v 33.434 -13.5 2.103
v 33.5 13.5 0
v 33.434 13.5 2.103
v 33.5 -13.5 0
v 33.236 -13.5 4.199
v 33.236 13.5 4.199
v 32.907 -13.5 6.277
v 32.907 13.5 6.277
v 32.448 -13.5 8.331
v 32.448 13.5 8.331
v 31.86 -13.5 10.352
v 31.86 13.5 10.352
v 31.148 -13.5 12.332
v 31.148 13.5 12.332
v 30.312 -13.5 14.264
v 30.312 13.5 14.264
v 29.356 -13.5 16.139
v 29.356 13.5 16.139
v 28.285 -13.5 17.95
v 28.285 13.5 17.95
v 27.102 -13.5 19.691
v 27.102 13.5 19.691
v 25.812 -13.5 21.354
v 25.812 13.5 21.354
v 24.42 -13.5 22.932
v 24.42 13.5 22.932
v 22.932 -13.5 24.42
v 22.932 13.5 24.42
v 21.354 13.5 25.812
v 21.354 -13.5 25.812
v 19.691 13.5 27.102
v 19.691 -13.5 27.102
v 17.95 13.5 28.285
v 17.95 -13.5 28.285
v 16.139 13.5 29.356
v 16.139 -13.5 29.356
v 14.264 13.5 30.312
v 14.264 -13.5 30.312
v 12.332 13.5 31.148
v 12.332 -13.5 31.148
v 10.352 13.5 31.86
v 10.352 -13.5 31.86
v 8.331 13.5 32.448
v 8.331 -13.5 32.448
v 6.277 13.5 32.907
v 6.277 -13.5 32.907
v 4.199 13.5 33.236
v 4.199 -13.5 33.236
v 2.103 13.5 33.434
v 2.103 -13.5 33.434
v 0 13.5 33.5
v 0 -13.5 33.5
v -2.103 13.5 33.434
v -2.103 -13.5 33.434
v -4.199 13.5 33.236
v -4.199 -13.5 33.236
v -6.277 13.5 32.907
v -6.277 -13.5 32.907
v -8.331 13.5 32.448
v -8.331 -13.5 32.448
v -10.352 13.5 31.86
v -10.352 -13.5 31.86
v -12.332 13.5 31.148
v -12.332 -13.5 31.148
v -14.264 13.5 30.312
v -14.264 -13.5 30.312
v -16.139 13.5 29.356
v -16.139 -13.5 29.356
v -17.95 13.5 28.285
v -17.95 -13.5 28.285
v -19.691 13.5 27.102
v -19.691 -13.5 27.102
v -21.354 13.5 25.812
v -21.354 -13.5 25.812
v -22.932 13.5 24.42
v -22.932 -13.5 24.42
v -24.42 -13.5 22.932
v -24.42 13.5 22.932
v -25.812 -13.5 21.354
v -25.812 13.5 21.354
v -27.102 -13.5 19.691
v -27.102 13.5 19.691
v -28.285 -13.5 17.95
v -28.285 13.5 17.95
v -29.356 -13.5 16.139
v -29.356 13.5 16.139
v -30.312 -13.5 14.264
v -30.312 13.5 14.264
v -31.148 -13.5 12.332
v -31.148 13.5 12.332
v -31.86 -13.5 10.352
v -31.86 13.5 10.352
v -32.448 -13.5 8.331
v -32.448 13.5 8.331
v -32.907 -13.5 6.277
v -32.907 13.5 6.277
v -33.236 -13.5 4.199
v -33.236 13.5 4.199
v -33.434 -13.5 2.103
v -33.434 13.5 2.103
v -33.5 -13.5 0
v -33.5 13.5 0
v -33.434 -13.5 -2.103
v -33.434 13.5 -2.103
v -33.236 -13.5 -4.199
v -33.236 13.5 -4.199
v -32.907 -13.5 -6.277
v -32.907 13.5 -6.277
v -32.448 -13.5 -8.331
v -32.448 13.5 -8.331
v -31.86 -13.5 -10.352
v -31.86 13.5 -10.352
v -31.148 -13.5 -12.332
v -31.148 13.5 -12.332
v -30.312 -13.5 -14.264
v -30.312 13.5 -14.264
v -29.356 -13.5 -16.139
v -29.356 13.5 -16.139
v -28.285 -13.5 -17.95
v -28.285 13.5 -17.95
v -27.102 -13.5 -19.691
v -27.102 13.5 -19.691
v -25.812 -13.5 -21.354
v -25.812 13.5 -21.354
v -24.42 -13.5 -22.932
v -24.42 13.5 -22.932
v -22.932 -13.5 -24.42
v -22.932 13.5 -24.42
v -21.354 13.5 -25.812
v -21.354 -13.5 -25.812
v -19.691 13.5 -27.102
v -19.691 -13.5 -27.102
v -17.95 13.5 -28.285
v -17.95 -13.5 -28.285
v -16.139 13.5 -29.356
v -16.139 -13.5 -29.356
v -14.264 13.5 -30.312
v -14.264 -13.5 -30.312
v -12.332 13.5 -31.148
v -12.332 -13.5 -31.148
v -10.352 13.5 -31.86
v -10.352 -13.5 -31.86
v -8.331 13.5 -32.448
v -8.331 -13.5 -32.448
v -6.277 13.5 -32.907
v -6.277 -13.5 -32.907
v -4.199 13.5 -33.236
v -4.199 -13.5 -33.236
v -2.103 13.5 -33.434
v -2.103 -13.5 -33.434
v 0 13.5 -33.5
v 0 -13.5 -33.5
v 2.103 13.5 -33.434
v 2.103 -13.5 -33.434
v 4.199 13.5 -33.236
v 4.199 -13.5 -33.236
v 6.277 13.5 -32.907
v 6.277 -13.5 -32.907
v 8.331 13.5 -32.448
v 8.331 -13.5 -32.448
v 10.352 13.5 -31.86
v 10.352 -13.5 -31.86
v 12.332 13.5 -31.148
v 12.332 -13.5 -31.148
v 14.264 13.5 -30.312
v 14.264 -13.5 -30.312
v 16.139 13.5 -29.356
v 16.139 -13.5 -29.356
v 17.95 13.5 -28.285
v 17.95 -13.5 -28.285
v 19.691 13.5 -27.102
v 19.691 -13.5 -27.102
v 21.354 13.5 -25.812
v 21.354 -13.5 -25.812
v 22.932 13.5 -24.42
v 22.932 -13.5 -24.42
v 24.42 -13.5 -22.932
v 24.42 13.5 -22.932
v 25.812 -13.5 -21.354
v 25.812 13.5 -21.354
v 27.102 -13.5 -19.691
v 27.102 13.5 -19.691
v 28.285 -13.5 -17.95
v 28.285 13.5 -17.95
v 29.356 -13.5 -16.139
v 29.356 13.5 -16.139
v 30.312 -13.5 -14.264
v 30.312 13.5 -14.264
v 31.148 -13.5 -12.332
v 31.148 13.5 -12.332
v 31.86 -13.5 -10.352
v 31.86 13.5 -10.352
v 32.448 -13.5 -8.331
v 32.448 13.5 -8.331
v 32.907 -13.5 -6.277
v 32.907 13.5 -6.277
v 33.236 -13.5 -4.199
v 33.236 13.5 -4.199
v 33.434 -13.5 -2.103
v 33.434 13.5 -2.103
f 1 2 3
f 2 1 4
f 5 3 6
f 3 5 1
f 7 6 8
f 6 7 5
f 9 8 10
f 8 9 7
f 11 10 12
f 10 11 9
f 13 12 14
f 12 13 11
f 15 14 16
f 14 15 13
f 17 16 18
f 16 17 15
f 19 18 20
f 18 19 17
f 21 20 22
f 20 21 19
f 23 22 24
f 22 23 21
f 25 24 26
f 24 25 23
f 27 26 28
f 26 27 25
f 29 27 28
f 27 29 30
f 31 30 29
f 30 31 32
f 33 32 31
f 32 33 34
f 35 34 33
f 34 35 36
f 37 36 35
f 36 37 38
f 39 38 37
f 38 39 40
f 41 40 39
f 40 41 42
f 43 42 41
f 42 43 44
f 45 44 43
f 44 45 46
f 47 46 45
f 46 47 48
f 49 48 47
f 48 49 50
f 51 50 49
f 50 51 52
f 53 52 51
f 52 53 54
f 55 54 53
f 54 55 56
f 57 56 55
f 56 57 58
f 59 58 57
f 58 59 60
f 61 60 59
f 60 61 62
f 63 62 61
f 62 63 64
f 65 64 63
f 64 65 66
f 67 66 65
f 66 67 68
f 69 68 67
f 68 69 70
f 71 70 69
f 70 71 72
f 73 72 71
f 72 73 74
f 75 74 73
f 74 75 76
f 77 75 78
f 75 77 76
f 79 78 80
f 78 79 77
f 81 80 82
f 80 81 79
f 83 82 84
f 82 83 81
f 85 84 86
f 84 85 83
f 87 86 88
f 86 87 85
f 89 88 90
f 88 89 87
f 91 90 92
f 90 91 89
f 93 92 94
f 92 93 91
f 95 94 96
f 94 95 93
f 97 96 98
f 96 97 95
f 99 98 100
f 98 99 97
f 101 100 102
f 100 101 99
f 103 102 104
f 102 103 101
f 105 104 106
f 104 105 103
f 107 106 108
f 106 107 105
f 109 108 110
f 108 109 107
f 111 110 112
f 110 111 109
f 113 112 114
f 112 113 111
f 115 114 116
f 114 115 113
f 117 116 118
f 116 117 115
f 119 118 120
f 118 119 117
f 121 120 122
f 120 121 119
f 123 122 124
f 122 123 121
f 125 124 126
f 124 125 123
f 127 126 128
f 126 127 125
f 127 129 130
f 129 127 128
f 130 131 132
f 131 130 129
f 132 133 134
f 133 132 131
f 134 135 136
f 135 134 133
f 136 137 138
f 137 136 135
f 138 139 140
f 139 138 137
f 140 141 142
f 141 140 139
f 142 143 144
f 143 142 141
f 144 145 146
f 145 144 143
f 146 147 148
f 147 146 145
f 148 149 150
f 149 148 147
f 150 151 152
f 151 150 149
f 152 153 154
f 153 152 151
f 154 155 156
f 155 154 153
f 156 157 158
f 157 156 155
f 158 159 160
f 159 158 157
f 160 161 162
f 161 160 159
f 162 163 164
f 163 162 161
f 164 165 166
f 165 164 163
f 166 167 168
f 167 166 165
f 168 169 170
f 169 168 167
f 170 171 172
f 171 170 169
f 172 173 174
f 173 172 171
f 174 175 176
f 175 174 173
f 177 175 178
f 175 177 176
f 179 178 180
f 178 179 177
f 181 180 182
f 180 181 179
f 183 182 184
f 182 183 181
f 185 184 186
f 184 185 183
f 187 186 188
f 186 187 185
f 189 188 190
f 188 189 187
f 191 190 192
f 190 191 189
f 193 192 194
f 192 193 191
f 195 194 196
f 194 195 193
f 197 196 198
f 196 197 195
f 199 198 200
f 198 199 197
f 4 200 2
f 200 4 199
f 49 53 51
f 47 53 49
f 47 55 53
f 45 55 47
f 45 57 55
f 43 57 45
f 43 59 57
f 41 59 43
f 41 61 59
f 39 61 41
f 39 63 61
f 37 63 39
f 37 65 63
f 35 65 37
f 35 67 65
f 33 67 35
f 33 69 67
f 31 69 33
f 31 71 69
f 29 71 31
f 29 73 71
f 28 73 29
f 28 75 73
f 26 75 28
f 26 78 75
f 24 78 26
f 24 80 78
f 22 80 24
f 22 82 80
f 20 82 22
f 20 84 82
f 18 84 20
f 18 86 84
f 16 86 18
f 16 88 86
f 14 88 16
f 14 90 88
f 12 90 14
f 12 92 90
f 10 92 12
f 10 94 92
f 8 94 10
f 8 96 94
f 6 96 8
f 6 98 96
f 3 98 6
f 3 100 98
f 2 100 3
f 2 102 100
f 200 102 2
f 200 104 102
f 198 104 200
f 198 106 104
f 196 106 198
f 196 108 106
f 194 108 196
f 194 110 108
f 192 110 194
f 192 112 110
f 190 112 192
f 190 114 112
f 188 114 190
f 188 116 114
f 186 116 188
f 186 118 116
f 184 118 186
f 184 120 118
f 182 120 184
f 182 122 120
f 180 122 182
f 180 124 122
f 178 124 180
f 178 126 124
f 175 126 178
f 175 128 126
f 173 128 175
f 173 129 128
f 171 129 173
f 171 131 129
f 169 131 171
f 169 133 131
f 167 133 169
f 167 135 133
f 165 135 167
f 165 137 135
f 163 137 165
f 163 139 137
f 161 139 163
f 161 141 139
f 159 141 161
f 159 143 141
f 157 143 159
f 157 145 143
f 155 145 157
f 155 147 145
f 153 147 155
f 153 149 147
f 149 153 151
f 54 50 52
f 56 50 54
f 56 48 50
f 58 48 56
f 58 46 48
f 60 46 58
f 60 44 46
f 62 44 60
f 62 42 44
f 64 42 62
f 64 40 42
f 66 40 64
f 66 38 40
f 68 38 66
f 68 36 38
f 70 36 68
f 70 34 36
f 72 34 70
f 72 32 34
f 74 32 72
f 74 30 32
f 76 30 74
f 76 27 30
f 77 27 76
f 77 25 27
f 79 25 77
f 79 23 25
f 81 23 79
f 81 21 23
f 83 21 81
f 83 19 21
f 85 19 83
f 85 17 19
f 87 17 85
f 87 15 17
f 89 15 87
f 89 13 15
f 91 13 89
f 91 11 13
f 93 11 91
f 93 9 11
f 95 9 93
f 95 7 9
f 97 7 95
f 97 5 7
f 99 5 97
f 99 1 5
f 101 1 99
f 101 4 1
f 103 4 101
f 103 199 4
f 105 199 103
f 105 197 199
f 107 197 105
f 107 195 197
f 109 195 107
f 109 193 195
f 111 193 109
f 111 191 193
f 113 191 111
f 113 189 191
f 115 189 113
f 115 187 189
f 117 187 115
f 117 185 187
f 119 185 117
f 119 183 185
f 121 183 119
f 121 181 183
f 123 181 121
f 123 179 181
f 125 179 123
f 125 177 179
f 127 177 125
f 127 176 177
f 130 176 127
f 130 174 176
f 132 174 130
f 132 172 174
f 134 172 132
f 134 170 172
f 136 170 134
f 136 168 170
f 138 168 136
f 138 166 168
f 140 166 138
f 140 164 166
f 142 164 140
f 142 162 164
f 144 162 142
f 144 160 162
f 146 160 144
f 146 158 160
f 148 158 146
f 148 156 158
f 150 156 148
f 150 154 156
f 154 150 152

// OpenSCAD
$fn = 100;
rotate(a = 90, v = [1, 0, 0])
{
  cylinder(h = 27, r = 33.5, center = true);
}
